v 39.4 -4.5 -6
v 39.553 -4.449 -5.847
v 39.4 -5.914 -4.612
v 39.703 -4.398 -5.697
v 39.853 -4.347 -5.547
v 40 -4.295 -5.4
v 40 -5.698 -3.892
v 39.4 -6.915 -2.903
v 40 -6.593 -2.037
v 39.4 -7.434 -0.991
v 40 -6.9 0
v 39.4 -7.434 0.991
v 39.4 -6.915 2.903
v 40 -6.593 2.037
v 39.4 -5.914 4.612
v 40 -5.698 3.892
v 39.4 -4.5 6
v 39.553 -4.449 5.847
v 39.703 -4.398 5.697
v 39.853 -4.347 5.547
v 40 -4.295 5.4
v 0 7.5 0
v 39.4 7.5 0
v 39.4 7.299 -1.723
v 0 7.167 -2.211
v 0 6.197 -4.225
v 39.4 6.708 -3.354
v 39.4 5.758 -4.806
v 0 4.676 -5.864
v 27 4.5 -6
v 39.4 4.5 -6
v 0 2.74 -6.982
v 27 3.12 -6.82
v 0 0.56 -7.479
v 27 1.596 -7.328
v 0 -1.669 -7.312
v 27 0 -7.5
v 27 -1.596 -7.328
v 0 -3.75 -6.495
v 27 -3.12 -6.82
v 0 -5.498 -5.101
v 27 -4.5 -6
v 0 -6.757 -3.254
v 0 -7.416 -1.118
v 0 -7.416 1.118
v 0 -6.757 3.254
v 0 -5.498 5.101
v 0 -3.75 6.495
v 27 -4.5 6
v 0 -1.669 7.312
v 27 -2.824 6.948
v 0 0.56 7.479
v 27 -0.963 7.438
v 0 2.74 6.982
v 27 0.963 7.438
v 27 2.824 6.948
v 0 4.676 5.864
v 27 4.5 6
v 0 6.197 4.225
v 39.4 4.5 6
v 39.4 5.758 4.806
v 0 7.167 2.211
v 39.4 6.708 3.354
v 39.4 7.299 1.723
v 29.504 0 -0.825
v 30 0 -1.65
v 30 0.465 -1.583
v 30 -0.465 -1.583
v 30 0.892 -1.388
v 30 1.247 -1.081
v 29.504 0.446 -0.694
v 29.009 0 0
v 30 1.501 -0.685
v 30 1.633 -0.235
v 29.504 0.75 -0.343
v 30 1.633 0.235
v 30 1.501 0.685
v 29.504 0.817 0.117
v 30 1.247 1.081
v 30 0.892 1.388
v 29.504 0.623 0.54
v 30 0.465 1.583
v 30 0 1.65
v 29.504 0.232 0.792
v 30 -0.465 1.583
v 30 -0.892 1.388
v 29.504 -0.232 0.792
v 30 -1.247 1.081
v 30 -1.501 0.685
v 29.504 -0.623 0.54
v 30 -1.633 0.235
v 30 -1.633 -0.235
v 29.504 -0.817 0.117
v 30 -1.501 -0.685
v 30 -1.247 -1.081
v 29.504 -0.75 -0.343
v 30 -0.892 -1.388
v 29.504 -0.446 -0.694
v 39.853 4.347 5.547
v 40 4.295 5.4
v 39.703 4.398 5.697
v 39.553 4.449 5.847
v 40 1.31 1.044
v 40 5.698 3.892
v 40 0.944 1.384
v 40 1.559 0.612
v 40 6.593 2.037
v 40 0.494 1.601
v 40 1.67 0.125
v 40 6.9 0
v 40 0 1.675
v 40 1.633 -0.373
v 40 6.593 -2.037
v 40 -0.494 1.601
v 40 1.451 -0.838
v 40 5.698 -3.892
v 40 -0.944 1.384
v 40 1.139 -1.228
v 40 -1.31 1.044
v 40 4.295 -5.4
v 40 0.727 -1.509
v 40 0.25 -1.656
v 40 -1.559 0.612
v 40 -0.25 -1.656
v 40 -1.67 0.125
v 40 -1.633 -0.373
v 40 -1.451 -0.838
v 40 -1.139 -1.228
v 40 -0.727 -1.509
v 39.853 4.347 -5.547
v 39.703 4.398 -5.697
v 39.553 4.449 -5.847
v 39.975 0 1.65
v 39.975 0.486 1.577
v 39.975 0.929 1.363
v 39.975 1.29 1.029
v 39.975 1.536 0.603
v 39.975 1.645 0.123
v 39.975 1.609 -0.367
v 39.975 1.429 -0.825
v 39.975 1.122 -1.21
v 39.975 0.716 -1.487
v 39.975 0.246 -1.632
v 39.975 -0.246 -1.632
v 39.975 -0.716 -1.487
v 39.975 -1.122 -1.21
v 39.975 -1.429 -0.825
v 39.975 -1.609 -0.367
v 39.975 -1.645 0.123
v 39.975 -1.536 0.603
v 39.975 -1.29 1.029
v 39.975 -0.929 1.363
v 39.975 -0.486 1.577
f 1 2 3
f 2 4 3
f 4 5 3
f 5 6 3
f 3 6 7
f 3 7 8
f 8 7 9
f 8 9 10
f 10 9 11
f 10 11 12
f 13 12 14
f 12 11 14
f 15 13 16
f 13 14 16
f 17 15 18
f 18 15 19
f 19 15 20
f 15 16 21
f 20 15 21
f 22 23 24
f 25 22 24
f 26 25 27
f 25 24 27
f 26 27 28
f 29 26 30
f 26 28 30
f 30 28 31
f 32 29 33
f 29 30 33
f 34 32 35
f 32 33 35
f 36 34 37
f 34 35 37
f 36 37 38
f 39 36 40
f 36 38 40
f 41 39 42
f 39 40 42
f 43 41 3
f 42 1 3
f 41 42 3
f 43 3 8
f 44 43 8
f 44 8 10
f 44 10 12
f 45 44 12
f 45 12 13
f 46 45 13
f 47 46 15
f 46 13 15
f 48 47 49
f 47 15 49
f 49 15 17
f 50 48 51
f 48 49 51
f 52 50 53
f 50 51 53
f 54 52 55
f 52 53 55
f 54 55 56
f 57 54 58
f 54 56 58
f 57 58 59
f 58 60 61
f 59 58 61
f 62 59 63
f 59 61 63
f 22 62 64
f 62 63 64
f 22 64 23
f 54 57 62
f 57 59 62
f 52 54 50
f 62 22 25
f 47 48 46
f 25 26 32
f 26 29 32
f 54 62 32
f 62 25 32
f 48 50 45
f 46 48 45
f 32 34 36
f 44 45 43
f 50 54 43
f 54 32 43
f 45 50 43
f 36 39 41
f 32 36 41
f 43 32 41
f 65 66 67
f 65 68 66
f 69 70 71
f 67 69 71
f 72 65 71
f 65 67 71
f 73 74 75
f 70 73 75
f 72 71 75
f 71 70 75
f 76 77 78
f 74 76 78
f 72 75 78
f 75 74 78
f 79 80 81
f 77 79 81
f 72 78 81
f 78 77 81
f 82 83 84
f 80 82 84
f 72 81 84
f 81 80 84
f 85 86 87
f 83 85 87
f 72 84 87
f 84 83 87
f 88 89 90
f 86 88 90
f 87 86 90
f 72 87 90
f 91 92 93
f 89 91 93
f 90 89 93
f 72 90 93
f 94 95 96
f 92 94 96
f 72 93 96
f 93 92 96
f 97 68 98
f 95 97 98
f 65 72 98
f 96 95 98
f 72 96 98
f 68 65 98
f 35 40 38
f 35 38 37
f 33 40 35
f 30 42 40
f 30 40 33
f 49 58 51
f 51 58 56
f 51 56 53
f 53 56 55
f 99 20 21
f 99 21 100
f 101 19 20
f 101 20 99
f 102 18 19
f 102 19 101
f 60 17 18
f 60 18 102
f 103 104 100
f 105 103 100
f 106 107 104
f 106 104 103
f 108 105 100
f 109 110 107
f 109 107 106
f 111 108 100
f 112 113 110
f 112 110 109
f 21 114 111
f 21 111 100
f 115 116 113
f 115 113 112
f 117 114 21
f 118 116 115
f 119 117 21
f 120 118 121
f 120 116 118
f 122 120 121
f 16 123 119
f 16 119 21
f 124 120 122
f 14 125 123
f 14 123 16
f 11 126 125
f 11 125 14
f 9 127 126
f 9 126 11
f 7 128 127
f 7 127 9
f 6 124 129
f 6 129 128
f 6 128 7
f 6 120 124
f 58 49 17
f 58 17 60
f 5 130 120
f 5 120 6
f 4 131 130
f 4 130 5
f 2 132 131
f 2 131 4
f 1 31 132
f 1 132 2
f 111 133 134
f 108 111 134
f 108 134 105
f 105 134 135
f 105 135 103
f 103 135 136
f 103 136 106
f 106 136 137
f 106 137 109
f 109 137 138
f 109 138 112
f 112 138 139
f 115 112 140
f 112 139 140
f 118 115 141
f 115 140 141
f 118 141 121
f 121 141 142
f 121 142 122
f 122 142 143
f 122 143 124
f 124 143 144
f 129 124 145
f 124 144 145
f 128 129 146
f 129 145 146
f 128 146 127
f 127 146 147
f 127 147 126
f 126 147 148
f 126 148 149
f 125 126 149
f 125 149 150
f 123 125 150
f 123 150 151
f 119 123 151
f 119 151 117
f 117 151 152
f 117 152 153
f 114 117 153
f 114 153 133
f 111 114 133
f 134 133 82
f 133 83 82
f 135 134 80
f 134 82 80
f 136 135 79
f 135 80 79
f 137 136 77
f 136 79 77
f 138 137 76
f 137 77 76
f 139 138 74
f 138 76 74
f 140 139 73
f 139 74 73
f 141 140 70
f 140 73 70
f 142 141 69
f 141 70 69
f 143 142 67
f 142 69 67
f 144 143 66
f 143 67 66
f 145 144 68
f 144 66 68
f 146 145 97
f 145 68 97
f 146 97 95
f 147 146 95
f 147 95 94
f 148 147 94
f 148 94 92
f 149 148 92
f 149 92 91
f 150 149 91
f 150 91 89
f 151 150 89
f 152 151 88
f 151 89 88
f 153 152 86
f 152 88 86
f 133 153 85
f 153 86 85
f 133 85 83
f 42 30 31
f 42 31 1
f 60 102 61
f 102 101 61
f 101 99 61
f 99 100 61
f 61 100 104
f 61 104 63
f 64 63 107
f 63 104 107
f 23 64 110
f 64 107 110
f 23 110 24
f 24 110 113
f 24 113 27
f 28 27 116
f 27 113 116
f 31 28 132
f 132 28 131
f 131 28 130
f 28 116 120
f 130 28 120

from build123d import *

# Parameters (mm, degrees)
SKETCH1_W                         = 40
SKETCH1_H                         = 7.5
TAP_DRILL_FOR_M4_TAP1_D           = 3.3
TAP_DRILL_FOR_M4_TAP1_DEPTH       = 10
TAP_DRILL_FOR_M4_TAP1_CSINK_D     = 3.35
TAP_DRILL_FOR_M4_TAP1_CSINK_ANGLE = 90
TAP_DRILL_FOR_M4_TAP1_TIP         = 0.991420021
CUT_EXTRUDE1_DEPTH                = 13
CHAMFER1_SIZE                     = 0.6


with BuildPart() as part:
    # Sketch1 → Revolve1 (revolve)
    with BuildSketch(Plane.XY):
        with Locations((20, 3.75)):
            Rectangle(SKETCH1_W, SKETCH1_H)
    revolve(axis=Axis((40, 0, 0), (-1, 0, 0)))

    # Tap Drill for M4 Tap1
    with Locations(Plane(origin=(40, 0, 0), x_dir=(0, 0, -1), z_dir=(1, 0, 0))):
        with Locations((0, 0)):
            CounterSinkHole(TAP_DRILL_FOR_M4_TAP1_D / 2, TAP_DRILL_FOR_M4_TAP1_CSINK_D / 2, depth=TAP_DRILL_FOR_M4_TAP1_DEPTH, counter_sink_angle=TAP_DRILL_FOR_M4_TAP1_CSINK_ANGLE)
            with Locations((0, 0, -(TAP_DRILL_FOR_M4_TAP1_DEPTH + TAP_DRILL_FOR_M4_TAP1_TIP / 2))):  # 118° drill point
                Cone(0, TAP_DRILL_FOR_M4_TAP1_D / 2, TAP_DRILL_FOR_M4_TAP1_TIP, mode=Mode.SUBTRACT)

    # Sketch6 → Cut-Extrude1 (cut)
    with BuildSketch(Plane(origin=(40, 0, 0), x_dir=(0, 0, -1), z_dir=(1, 0, 0))):
        with BuildLine():
            Line((-6, -4.5), (-6, 4.5))
            ThreePointArc((-6, 4.5), (-7.5, 0), (-6, -4.5))
        make_face()
        with BuildLine():
            ThreePointArc((7.5, 0), (7.115124735, 2.371708245), (6, 4.5))
            Line((6, 4.5), (6, -4.5))
            ThreePointArc((6, -4.5), (7.115124735, -2.371708245), (7.5, 0))
        make_face()
    extrude(amount=-CUT_EXTRUDE1_DEPTH, mode=Mode.SUBTRACT)

    # Chamfer1
    chamfer1_edges = [part.edges().sort_by_distance(p)[0] for p in [
        (40, -7.5, 0),
        (40, 6.708203932, -3.354101966),
        (40, 0, 6),
        (40, 0, -6),
    ]]
    chamfer(chamfer1_edges, length=CHAMFER1_SIZE)


solid = part.part
